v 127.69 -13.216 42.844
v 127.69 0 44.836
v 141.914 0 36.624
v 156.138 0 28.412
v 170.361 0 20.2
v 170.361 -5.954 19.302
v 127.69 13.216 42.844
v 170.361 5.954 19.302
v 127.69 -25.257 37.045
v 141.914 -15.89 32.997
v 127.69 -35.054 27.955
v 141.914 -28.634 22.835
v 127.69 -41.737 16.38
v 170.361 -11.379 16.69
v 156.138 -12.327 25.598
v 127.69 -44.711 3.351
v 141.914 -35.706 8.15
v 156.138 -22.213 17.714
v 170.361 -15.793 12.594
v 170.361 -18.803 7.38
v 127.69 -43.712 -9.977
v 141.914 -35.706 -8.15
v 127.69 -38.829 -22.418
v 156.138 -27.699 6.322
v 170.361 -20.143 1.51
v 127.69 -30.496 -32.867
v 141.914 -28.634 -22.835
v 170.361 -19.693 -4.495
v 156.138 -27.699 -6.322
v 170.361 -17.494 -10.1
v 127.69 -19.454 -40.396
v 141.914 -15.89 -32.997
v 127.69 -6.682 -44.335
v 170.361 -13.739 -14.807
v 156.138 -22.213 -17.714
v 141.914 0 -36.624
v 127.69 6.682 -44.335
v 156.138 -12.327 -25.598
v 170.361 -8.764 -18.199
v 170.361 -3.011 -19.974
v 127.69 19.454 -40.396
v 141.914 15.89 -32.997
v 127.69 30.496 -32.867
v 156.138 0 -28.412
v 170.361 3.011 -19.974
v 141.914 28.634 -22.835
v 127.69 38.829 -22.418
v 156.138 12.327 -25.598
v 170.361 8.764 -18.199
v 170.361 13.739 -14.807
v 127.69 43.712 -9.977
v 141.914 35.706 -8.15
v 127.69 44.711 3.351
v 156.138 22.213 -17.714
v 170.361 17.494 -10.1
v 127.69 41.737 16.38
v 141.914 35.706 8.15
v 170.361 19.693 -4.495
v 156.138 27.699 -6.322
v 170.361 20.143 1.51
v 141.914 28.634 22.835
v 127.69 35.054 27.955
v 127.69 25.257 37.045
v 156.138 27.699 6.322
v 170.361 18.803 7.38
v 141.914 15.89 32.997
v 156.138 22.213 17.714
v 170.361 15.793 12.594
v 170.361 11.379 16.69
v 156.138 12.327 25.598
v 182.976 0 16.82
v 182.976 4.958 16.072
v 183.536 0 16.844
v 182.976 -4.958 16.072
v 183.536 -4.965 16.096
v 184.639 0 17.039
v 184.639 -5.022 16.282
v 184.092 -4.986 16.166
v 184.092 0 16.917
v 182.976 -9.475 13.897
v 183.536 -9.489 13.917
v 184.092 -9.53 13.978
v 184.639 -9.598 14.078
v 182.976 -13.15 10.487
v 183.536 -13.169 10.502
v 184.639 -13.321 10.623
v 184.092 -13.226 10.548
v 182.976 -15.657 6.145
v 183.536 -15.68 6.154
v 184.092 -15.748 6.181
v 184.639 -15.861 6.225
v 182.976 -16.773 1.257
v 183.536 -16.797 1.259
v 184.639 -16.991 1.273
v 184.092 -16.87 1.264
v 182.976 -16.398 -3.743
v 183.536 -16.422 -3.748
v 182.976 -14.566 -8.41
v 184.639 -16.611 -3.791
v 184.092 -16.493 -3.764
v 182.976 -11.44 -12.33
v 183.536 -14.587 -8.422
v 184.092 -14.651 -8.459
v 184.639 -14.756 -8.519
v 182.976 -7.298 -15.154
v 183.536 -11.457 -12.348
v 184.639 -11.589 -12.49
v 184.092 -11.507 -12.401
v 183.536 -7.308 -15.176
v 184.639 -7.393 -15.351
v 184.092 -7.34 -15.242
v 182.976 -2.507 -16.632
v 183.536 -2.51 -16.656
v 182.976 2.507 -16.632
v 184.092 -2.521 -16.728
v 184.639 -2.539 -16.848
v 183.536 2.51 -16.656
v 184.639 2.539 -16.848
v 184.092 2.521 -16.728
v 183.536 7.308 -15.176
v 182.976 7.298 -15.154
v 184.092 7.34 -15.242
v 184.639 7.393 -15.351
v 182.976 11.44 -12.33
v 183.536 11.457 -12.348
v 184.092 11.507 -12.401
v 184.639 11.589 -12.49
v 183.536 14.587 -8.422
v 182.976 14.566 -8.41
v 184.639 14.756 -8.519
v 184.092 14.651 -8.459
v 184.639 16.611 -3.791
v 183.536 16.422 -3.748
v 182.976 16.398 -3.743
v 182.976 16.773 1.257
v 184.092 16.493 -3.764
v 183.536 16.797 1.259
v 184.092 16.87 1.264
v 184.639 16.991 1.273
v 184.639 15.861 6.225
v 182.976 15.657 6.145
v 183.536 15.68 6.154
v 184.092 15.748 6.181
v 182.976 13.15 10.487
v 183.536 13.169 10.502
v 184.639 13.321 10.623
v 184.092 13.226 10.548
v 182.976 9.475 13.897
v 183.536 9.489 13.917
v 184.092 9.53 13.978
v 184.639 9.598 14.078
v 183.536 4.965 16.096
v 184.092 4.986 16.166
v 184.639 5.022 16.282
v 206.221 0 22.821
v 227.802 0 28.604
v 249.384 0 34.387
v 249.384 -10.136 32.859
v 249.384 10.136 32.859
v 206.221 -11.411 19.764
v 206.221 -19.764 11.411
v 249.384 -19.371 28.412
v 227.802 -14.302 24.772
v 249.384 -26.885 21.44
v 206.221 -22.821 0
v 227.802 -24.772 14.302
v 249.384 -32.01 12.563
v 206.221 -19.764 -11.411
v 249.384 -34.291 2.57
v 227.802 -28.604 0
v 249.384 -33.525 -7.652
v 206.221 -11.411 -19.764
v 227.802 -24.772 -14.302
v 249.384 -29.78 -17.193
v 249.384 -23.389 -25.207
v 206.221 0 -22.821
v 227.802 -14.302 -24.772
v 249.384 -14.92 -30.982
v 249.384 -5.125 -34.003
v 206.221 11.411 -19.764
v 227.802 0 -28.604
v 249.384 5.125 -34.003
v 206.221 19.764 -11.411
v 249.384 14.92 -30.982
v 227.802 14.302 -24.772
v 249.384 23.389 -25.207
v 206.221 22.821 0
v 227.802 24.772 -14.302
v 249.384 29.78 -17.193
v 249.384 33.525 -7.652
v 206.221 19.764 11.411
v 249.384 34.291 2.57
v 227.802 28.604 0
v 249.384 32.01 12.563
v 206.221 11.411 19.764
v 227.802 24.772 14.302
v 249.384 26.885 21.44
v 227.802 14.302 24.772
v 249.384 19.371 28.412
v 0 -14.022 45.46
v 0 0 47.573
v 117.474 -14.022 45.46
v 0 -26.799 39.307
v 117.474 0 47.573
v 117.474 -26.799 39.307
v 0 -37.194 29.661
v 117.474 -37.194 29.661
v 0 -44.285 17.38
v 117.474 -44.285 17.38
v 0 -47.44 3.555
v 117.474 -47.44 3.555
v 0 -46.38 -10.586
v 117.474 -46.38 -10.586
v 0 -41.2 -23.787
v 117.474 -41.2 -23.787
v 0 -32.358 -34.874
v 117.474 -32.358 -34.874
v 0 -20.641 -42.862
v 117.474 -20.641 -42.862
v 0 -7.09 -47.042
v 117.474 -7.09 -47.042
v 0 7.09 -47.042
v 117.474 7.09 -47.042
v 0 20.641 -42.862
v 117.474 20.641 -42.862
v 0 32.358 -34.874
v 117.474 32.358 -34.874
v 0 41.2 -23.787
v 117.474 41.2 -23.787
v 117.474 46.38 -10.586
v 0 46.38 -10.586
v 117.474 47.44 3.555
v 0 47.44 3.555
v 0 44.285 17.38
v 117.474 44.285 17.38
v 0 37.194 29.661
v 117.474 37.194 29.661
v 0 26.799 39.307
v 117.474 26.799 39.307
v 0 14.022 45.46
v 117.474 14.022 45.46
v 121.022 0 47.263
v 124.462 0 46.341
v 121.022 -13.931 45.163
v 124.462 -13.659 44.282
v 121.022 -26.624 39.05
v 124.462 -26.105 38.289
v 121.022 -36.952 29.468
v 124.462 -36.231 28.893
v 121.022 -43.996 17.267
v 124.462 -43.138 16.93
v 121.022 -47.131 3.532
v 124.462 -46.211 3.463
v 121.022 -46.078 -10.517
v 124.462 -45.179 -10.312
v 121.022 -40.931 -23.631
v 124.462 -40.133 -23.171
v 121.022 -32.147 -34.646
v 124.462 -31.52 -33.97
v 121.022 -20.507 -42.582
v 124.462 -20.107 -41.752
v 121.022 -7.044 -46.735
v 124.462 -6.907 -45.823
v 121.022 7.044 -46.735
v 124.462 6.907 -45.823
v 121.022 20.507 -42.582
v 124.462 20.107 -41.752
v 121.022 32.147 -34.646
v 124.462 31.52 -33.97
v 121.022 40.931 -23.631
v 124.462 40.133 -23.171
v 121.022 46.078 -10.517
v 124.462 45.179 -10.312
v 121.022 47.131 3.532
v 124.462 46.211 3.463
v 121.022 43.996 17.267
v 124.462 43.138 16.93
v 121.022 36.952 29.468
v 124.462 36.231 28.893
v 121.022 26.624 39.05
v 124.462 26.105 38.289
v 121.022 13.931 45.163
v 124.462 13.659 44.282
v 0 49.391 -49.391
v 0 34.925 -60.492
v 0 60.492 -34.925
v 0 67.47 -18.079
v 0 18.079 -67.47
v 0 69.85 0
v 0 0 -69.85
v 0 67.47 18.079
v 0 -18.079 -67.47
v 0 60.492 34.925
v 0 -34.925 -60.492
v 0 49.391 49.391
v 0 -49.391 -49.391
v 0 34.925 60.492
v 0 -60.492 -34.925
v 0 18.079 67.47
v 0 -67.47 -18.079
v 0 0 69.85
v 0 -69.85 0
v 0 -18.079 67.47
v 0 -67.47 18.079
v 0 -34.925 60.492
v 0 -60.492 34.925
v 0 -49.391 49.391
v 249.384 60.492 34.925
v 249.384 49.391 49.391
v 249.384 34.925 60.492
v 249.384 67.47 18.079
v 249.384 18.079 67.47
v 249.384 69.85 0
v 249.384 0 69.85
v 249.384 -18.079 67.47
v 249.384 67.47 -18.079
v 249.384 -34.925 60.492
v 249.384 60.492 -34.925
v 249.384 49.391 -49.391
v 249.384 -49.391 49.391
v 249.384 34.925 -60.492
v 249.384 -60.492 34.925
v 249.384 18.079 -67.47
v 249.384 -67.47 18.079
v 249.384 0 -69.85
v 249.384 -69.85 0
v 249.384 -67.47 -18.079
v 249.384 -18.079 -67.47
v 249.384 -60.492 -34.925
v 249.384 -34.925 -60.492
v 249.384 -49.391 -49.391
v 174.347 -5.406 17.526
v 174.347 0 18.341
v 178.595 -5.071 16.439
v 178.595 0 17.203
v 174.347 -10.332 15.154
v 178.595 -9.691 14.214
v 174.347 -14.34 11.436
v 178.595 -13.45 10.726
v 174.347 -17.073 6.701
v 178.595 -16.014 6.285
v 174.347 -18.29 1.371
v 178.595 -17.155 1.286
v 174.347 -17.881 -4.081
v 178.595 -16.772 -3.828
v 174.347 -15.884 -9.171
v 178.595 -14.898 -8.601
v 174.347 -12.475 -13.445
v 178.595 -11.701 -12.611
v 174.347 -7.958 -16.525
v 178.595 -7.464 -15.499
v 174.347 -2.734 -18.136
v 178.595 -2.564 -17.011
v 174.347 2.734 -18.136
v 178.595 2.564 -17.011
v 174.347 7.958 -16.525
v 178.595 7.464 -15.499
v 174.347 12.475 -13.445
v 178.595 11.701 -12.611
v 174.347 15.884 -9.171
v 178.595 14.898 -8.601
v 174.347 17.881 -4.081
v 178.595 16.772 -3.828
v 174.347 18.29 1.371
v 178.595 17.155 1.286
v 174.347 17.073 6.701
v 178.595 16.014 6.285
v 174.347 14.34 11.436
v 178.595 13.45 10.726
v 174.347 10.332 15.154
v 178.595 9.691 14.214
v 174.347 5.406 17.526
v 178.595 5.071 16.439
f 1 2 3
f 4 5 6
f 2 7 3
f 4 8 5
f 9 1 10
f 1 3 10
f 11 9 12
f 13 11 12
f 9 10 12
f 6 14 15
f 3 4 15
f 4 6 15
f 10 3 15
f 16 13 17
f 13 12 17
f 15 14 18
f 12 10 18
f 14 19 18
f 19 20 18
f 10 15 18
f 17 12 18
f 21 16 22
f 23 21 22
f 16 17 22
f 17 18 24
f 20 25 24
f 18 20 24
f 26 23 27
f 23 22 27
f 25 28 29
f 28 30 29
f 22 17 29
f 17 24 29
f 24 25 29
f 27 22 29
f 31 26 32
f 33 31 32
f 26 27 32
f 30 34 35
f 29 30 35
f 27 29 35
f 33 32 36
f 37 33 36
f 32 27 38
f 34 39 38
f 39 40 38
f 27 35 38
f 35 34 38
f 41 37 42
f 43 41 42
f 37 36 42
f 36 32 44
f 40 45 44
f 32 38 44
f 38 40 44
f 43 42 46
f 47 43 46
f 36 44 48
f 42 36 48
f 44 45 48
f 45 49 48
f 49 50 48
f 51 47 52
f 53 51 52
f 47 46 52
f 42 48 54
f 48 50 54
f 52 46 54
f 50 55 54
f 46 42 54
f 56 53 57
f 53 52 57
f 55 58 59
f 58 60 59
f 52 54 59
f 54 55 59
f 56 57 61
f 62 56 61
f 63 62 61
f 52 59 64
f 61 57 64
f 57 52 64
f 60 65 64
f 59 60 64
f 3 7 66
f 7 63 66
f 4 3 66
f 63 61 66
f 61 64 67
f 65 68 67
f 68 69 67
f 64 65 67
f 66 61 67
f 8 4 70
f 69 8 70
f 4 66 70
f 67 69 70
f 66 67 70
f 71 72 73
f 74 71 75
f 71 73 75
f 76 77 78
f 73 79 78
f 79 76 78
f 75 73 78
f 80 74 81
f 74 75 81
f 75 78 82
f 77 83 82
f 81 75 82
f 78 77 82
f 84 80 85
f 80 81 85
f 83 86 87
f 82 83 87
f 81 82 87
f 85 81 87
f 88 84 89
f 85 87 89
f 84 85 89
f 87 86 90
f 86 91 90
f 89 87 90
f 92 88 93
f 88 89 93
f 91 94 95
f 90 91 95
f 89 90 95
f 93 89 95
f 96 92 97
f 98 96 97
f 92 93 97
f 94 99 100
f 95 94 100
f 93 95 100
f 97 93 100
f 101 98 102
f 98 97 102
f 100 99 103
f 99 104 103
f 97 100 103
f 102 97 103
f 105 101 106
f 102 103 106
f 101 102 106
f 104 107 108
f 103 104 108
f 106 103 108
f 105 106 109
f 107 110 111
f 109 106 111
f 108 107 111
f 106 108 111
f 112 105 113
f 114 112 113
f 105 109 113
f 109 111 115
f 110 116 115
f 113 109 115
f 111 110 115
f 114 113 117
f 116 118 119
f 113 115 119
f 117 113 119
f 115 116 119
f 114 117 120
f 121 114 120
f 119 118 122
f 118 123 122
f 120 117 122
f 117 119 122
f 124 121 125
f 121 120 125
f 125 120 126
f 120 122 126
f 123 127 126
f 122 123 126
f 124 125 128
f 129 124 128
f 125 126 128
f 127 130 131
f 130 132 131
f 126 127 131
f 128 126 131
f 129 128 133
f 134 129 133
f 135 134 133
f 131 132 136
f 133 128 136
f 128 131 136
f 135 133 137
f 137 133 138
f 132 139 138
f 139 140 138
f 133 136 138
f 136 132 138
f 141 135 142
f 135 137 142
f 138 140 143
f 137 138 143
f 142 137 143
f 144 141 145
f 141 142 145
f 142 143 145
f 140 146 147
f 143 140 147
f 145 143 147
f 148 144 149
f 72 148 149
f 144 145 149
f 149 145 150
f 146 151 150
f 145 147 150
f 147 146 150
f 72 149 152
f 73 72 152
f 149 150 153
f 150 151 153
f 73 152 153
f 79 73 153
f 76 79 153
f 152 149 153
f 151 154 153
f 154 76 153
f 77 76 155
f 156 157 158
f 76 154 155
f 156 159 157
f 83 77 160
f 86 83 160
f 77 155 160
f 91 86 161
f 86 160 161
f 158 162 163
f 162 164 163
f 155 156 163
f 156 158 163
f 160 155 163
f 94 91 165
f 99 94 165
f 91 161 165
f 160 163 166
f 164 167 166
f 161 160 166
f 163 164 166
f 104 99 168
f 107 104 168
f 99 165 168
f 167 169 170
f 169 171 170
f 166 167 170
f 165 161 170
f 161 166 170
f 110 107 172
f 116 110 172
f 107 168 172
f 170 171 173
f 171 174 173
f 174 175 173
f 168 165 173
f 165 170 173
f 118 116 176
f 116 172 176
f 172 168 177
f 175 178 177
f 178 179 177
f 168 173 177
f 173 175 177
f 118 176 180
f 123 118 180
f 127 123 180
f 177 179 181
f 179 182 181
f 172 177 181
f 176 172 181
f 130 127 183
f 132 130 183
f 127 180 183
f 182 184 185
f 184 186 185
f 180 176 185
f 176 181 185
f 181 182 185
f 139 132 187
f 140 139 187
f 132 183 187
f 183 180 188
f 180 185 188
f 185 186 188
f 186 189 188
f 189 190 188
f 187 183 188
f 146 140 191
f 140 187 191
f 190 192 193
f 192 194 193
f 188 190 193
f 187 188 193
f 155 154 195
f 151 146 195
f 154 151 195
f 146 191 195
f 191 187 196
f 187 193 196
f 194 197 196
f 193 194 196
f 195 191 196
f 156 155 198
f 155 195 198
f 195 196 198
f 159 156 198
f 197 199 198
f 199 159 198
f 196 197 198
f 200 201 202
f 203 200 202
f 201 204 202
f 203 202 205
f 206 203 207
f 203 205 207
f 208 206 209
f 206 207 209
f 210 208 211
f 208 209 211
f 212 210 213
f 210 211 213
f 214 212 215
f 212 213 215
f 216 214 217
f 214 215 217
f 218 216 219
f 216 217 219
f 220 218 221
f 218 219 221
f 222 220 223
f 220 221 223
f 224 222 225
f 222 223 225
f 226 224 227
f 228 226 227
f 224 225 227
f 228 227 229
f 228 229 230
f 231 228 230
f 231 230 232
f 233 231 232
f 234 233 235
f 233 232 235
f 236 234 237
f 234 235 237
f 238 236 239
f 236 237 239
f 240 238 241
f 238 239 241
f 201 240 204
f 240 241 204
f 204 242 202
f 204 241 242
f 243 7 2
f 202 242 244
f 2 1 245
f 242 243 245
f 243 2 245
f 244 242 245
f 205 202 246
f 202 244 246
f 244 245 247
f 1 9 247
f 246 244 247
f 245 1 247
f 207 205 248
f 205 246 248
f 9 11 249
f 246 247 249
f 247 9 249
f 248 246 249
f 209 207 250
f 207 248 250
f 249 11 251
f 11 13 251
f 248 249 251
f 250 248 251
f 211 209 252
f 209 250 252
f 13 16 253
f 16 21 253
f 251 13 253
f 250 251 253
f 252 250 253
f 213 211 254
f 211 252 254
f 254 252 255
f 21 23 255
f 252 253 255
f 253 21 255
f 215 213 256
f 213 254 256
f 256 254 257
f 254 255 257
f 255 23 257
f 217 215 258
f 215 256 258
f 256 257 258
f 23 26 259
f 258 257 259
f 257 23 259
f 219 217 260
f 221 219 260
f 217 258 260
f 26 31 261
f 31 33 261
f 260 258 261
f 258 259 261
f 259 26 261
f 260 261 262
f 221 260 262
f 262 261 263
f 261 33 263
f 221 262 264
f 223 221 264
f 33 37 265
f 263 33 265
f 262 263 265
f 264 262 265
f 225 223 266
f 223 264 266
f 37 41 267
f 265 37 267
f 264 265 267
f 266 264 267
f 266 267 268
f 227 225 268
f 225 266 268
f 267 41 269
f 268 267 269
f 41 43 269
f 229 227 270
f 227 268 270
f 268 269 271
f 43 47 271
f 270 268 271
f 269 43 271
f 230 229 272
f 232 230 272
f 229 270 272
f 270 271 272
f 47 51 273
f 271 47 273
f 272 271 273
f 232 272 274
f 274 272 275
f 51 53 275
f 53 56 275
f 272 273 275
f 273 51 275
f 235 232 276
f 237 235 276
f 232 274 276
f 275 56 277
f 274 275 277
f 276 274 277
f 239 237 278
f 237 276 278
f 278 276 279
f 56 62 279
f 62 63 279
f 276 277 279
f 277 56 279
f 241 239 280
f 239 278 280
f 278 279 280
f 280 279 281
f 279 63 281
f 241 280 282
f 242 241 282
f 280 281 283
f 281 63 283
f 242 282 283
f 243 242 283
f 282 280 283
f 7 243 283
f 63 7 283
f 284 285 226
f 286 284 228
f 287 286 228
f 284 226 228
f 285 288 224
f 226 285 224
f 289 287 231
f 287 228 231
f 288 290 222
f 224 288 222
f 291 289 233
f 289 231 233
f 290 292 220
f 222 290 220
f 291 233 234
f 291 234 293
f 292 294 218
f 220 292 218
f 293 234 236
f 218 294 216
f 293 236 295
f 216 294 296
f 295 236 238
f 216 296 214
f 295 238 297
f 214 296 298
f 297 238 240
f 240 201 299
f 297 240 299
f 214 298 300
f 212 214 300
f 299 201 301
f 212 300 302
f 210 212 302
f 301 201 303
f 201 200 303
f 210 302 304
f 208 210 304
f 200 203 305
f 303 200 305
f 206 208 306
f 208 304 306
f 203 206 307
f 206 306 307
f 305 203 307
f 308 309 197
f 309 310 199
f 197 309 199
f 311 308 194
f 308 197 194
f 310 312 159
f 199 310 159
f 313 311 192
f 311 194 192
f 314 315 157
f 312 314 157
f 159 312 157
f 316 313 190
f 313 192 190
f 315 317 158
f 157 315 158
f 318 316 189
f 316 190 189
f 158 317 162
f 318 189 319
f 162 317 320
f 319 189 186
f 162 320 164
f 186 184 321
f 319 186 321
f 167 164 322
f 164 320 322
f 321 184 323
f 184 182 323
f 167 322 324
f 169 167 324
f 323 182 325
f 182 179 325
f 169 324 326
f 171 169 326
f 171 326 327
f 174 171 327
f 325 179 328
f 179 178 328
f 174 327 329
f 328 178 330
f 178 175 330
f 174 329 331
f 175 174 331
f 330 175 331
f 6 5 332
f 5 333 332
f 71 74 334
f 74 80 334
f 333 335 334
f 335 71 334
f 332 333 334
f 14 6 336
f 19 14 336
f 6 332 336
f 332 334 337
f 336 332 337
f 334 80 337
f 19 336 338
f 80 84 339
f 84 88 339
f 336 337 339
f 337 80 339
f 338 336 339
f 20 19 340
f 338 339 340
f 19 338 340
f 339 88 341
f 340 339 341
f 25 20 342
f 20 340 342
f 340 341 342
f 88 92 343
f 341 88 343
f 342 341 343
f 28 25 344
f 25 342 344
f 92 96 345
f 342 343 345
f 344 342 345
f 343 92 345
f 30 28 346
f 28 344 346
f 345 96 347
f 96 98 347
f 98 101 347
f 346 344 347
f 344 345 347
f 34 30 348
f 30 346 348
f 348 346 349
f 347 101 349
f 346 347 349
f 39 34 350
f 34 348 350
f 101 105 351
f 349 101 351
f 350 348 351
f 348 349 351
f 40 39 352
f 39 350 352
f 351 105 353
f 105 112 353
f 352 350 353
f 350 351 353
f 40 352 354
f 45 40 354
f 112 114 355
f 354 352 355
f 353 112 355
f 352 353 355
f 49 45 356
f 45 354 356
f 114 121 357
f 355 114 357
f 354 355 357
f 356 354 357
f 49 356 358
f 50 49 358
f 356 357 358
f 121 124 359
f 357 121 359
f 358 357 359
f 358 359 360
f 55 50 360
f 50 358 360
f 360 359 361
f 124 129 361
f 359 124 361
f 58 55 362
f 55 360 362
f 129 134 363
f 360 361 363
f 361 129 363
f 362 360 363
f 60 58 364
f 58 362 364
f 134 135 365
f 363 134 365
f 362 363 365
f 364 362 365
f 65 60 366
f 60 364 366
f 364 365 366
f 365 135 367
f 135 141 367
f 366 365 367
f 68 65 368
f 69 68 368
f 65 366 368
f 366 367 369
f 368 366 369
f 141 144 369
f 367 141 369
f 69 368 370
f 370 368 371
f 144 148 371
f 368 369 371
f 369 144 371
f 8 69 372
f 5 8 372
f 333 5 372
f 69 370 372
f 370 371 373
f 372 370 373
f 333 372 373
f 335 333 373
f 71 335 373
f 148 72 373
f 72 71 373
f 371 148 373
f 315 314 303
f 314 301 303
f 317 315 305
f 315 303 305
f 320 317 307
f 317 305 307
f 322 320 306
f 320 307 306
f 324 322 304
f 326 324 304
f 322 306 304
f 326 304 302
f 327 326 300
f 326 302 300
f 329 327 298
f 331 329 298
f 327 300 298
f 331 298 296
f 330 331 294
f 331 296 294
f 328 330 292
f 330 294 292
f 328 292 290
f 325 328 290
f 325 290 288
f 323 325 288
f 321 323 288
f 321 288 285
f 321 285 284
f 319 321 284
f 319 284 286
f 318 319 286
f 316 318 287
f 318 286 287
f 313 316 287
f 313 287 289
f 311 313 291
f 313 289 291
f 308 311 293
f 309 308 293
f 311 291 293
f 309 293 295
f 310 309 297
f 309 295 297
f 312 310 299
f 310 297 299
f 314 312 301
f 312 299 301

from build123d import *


with BuildPart() as part:
    # Model → Revolve1 (revolve)
    with BuildSketch(Plane.XY, mode=Mode.PRIVATE) as revolve1_sk:
        with BuildLine():
            Line((0, 47.573231), (117.474371, 47.573231))
            ThreePointArc((117.474371, 47.573231), (122.762513596, 46.877033869), (127.690278, 44.835887))
            Line((127.690278, 44.835887), (170.361247243, 20.199791421))
            ThreePointArc((170.361247243, 20.199791421), (176.44612601, 17.679352192), (182.976005243, 16.819677421))
            ThreePointArc((182.976005243, 16.819677421), (183.814650955, 16.874644956), (184.638947243, 17.038607421))
            Line((184.638947243, 17.038607421), (249.383859243, 34.386954421))
            Line((249.383859243, 34.386954421), (249.383859243, 69.85))
            Line((249.383859243, 69.85), (0, 69.85))
            Line((0, 69.85), (0, 47.573231))
        make_face()
    revolve(revolve1_sk.sketch.rotate(Axis((0, 0, 0), (1, 0, 0)), 90), axis=Axis((0, 0, 0), (1, 0, 0)))


solid = part.part
